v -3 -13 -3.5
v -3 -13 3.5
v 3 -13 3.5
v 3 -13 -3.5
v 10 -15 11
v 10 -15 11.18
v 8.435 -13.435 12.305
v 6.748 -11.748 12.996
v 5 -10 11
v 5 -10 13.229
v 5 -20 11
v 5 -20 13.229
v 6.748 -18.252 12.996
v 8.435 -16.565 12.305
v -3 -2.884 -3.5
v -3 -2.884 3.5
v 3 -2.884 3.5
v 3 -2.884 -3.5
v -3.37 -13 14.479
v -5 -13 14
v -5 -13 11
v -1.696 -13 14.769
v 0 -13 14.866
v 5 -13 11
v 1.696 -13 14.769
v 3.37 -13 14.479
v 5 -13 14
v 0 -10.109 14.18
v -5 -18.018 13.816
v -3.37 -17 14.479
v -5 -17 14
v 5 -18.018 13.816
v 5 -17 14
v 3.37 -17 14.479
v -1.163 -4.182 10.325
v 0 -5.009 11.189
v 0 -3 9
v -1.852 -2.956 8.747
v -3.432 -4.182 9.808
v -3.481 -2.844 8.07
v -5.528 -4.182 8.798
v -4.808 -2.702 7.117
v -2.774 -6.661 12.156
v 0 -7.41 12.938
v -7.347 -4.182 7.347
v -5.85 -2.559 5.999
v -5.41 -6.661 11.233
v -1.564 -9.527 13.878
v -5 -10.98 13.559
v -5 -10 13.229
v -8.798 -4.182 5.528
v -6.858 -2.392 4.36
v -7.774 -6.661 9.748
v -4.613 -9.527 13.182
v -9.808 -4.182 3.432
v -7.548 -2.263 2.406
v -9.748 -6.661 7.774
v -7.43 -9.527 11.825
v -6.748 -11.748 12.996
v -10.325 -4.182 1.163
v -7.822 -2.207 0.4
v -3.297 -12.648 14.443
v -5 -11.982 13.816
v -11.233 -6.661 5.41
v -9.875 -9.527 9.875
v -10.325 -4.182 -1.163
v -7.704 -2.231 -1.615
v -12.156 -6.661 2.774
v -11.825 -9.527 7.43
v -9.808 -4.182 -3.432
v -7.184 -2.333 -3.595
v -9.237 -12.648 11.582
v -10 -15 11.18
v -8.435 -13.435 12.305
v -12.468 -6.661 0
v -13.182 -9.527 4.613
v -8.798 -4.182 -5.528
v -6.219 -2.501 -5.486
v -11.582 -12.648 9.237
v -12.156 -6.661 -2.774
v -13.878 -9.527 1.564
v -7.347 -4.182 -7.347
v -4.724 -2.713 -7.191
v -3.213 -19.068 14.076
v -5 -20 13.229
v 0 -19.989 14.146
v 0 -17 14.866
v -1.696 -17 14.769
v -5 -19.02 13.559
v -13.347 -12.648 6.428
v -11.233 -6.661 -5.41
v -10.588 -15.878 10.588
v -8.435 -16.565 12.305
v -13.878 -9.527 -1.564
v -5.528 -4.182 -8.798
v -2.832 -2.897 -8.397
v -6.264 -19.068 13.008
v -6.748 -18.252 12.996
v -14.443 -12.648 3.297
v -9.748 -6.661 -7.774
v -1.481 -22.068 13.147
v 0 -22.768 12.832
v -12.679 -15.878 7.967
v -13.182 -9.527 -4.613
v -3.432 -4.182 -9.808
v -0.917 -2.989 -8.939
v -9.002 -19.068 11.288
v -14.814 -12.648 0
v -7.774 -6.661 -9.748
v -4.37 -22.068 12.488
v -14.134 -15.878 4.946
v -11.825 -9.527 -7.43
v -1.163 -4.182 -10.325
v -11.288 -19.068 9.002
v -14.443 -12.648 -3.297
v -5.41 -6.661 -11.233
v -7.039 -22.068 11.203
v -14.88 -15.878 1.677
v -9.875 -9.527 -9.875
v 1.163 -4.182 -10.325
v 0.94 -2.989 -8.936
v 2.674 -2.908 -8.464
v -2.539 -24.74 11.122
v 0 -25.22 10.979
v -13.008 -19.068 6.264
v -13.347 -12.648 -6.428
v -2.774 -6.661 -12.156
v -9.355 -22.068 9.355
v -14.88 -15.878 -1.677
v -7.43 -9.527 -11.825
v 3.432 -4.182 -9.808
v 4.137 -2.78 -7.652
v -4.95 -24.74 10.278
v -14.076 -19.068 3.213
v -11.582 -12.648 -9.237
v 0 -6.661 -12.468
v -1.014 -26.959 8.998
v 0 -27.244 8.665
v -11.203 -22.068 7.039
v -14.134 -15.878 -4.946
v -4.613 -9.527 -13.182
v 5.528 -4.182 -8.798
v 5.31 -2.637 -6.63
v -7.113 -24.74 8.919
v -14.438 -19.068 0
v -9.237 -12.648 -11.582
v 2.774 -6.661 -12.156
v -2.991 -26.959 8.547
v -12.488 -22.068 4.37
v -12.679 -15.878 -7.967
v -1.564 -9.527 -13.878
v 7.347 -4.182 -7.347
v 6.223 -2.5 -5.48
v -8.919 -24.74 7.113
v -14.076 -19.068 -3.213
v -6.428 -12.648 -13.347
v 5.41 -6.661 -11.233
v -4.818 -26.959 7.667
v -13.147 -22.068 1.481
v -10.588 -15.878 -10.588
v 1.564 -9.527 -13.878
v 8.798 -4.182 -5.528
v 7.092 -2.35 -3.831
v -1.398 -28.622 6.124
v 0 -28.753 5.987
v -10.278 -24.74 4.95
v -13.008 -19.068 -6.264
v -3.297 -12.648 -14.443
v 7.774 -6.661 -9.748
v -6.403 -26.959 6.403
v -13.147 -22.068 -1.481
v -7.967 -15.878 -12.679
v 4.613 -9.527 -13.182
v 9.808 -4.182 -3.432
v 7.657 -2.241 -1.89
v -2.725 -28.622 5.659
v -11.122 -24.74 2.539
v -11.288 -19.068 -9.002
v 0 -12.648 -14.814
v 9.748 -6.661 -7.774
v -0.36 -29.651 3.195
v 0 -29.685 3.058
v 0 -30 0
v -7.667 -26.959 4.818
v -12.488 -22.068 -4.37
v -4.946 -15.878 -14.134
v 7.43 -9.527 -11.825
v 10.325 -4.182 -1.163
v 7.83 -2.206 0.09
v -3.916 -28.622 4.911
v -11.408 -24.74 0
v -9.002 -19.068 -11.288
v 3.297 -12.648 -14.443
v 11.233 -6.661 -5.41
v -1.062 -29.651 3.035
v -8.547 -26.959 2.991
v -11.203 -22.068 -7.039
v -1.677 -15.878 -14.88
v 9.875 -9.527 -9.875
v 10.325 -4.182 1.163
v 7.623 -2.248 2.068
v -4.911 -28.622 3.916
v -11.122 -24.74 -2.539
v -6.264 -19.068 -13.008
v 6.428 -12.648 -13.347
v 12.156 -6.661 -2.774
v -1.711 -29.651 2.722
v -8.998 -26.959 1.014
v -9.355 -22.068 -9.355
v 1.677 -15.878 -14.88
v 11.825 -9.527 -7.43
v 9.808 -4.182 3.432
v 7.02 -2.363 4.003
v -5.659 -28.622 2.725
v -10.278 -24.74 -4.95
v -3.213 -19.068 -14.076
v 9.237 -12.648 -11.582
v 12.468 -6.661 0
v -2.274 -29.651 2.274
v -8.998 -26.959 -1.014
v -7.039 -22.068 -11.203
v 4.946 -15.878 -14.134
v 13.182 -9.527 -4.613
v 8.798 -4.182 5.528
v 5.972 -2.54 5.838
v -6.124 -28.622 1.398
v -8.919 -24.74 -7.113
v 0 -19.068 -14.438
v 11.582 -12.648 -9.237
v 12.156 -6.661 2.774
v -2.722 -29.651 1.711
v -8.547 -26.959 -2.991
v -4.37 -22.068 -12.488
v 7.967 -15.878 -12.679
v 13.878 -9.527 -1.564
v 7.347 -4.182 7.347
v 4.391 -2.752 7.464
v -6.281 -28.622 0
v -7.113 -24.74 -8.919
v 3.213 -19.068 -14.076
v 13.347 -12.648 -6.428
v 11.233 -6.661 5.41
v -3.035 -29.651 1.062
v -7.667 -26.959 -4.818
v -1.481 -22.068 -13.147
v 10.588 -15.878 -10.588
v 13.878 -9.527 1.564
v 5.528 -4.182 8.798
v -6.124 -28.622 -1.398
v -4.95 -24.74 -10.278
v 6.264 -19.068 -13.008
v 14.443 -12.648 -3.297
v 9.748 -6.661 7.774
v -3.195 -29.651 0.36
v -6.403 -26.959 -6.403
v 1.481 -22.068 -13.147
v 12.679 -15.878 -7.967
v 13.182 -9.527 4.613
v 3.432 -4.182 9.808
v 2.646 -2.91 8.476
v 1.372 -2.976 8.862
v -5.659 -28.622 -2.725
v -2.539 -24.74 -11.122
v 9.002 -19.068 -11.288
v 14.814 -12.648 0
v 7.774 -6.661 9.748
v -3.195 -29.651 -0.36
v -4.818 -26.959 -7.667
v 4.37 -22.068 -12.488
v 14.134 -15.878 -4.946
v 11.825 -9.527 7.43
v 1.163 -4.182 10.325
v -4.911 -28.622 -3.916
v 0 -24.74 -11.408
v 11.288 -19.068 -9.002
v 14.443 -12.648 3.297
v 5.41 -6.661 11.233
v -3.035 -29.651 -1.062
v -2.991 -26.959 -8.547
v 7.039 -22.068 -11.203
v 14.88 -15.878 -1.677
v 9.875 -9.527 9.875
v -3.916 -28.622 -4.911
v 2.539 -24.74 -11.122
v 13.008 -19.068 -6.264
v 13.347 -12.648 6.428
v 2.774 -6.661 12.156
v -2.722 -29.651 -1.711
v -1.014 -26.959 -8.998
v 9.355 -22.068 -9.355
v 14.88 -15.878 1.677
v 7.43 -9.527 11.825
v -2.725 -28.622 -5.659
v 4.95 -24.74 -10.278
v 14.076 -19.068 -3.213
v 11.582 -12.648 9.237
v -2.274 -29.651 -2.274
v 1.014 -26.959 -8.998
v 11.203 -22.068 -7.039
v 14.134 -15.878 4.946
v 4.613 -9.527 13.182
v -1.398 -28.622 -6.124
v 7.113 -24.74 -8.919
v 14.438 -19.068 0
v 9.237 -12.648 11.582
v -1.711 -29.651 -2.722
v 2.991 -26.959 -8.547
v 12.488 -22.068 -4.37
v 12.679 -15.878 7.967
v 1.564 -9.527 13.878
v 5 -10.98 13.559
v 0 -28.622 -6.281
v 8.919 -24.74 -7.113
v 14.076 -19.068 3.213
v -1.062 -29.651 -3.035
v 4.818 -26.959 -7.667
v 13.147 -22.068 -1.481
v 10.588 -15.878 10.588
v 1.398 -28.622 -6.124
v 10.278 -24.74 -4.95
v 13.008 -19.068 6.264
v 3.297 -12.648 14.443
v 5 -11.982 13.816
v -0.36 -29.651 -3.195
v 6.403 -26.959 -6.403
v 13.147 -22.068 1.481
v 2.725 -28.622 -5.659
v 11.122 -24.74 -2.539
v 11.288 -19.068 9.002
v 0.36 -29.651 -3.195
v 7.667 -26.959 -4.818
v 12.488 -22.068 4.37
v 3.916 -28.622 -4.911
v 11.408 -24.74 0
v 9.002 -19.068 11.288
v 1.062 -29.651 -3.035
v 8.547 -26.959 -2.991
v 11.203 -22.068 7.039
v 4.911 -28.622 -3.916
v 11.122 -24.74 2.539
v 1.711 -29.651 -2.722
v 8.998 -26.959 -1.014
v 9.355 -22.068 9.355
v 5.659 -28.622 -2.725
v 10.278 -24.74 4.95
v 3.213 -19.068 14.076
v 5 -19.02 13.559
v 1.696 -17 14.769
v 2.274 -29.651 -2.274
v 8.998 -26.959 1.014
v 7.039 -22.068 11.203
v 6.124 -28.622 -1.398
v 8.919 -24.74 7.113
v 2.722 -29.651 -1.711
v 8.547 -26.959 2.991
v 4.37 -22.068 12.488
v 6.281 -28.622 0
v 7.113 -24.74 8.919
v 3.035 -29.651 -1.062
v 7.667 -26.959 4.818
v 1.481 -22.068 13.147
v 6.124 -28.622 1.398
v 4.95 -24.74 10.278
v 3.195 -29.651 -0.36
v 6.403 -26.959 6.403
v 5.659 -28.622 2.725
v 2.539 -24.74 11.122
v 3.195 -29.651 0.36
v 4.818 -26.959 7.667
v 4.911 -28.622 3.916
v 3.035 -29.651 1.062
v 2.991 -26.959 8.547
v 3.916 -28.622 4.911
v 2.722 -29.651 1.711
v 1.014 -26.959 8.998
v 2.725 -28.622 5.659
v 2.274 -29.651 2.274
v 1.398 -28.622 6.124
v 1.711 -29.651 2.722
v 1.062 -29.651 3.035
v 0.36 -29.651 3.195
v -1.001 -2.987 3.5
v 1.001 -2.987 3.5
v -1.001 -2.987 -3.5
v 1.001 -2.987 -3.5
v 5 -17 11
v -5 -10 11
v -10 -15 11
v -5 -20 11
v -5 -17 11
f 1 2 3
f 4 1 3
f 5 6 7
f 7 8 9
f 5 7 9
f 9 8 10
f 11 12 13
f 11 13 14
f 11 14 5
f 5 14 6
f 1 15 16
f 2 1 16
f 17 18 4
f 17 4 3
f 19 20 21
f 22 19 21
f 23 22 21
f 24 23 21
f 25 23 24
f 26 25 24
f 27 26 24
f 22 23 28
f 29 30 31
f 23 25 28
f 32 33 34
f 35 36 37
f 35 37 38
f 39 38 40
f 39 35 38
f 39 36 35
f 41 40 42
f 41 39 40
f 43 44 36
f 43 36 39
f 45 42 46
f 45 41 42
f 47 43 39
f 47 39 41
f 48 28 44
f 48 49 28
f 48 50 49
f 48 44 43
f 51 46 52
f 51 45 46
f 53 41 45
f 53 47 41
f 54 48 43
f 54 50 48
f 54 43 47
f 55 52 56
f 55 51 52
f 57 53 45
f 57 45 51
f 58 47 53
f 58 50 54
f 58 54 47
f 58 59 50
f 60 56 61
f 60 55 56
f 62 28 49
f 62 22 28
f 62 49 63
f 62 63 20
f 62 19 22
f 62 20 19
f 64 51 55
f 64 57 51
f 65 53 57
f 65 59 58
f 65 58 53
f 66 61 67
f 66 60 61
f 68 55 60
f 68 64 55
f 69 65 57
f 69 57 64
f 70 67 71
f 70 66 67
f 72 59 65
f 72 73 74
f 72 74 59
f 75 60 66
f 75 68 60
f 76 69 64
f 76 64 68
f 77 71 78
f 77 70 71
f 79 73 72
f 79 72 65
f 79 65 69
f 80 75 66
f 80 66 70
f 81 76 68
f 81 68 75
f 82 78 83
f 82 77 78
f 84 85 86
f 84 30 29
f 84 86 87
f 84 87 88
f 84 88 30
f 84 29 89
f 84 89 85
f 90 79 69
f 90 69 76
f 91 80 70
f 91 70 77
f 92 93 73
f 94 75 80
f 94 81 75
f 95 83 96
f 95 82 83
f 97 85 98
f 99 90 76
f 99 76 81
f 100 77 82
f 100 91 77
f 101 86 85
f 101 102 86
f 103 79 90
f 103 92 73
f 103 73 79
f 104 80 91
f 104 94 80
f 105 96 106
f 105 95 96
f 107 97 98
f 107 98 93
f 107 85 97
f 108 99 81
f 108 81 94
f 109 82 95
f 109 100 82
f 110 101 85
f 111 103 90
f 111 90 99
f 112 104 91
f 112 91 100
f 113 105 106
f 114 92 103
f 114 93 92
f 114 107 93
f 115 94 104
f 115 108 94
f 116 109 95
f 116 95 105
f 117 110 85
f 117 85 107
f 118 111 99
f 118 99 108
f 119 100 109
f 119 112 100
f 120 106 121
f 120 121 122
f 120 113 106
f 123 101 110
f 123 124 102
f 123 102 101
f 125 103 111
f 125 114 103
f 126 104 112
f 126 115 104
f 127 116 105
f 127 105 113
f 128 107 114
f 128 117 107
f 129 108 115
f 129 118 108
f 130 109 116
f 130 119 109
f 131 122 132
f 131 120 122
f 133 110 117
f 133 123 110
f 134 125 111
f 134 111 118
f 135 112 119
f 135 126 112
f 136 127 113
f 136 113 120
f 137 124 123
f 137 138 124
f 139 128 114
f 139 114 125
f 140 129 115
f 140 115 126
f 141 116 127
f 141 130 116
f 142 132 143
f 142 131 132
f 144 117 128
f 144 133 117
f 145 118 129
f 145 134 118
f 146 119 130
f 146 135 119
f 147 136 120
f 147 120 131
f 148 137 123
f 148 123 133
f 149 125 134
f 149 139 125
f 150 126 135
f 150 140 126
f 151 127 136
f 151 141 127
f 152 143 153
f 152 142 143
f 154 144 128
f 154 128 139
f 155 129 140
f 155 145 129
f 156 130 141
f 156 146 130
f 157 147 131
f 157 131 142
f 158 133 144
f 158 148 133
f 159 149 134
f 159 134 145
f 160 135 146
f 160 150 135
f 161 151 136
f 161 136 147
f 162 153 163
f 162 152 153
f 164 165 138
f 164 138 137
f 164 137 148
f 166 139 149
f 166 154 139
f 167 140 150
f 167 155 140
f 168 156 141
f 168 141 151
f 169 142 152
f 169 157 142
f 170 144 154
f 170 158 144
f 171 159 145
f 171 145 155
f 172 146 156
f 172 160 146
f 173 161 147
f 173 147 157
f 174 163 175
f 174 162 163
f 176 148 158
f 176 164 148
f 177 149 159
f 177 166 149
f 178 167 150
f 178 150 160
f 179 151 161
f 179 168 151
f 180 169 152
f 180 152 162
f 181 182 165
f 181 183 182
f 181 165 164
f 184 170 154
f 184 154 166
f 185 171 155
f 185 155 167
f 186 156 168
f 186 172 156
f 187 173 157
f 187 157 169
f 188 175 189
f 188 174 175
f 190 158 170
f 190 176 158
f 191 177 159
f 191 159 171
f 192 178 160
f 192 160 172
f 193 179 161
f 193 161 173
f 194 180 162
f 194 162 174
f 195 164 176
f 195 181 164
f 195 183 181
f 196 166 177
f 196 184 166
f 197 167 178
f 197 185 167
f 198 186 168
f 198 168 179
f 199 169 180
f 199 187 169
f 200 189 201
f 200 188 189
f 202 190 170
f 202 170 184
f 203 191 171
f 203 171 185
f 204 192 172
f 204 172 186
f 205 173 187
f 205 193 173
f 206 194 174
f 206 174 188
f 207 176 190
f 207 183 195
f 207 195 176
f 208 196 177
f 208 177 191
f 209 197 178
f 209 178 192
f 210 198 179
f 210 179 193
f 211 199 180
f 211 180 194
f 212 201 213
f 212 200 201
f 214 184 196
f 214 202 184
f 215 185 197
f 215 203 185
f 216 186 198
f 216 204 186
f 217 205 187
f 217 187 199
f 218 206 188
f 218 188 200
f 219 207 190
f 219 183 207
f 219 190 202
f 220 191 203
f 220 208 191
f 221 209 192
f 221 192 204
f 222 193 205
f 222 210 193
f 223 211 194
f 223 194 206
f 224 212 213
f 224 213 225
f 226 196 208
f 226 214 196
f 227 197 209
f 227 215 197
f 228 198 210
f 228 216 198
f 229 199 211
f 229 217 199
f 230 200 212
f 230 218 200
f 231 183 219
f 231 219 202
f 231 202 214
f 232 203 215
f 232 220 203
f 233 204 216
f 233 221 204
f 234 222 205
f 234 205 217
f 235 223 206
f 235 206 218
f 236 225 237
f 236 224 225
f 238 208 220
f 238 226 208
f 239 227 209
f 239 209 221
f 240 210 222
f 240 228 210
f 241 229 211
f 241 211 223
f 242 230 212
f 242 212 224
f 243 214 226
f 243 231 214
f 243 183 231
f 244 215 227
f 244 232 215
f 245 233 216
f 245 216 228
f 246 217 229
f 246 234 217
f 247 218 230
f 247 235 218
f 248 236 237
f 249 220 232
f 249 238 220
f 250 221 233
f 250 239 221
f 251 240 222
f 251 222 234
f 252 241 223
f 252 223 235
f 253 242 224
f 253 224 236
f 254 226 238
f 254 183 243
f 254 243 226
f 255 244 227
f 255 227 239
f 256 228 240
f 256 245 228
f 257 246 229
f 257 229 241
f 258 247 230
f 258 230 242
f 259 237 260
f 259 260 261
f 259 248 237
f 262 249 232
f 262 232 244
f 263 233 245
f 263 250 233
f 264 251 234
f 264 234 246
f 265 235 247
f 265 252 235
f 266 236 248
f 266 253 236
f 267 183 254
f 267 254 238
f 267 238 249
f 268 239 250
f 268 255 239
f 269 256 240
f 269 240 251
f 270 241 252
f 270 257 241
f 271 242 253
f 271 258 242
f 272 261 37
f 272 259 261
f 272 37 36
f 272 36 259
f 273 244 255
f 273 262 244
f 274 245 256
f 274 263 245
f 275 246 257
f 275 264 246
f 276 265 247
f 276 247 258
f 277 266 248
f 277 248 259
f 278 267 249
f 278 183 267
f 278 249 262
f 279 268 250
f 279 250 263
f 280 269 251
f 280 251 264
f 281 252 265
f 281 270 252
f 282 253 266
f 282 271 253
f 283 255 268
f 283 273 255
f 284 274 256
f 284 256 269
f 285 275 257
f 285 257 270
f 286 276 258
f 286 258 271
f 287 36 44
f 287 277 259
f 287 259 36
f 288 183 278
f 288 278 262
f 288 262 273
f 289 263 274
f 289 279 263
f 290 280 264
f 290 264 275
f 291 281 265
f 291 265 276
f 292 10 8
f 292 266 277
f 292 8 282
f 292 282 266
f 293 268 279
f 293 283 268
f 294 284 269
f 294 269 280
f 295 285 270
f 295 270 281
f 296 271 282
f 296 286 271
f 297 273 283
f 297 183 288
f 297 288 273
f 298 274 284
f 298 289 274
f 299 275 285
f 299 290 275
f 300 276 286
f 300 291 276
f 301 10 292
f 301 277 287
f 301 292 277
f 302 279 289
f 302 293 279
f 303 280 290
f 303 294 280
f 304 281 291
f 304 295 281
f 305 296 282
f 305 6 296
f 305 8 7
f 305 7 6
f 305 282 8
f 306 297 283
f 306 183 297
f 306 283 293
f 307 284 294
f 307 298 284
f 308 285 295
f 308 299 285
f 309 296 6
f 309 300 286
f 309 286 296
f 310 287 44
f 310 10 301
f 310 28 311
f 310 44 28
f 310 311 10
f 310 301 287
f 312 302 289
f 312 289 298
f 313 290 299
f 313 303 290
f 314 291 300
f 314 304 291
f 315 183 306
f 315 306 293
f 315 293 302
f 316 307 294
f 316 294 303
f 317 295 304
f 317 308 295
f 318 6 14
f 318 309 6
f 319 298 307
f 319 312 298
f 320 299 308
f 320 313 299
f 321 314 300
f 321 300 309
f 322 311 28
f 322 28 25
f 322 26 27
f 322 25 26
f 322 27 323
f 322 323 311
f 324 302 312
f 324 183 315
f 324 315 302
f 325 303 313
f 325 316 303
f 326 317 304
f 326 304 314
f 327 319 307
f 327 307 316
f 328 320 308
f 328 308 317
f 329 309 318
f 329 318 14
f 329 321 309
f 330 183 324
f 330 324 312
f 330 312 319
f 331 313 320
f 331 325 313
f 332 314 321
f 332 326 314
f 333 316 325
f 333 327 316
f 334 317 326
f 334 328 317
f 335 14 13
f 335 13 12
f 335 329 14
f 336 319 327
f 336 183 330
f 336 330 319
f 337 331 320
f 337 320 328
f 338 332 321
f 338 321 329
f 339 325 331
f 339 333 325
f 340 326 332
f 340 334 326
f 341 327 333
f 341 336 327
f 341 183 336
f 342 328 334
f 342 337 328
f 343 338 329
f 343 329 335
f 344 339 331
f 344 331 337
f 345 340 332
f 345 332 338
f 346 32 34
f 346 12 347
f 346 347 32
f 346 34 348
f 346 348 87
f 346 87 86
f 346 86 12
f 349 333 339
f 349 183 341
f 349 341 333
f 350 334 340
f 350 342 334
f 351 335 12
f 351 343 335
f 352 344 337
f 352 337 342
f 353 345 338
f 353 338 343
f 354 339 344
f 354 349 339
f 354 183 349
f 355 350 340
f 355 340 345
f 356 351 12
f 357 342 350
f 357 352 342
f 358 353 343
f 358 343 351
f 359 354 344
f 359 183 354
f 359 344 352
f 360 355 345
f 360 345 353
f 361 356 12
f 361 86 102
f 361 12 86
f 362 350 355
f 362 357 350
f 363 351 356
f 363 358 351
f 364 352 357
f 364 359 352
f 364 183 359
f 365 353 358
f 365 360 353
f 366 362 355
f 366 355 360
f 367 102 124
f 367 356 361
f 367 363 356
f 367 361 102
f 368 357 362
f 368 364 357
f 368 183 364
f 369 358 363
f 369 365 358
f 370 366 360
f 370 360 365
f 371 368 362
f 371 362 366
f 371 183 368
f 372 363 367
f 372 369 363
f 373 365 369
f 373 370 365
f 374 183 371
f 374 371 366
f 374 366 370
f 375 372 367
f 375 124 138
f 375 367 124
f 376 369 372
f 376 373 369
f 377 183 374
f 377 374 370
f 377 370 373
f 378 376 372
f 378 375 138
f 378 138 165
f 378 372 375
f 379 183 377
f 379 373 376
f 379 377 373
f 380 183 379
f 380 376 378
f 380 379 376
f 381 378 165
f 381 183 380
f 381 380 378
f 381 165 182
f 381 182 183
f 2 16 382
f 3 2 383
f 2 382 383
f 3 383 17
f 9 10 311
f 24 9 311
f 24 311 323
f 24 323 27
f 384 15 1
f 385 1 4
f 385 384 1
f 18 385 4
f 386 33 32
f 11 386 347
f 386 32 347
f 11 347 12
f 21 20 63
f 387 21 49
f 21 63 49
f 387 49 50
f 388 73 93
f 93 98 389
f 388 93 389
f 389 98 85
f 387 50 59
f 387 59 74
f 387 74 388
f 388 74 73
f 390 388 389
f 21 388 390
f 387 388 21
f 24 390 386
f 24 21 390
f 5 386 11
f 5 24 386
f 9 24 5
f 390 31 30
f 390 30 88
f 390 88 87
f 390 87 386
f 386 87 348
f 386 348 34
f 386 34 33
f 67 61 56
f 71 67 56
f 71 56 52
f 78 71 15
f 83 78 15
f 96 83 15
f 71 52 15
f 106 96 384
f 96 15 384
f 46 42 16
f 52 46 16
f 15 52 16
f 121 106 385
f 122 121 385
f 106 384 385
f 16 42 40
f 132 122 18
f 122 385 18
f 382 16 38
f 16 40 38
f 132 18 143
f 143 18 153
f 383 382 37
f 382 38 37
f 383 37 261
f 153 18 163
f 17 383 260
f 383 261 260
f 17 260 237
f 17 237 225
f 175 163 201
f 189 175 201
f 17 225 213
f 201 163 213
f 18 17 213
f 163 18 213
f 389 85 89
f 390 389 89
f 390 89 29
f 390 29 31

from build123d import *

# Parameters (mm, degrees)
F4_DEPTH = 30.001
F5_W     = 6
F5_H     = 7
F6_DEPTH = 13
F8_W     = 10
F8_H     = 4
F9_DEPTH = 7


with BuildPart() as f1:
    # F0 (on Right) → F1 (revolve)
    with BuildSketch(Plane.YZ):
        with BuildLine():
            Line((-30, 0), (0, 0))
            ThreePointArc((0, 0), (-15, 15), (-30, 0))
        make_face()
    revolve(axis=Axis((0, -15, 0), (0, -1, 0)))

    # F3 (on offset) → F4 (cut, through all)
    with BuildSketch(Plane.XY.offset(15)):
        with BuildLine():
            Line((15, 0), (0, 0))
            Line((0, 0), (-15, 0))
            ThreePointArc((-15, 0), (0, -3), (15, 0))
        make_face()
    extrude(amount=-F4_DEPTH, mode=Mode.SUBTRACT)

    # F5 (on Front) → F6 (cut)
    with BuildSketch(Plane.XZ):
        Rectangle(F5_W, F5_H)
    extrude(amount=F6_DEPTH, mode=Mode.SUBTRACT)

    # F8 (on offset) → F9 (cut)
    with BuildSketch(Plane.XY.offset(18)):
        with Locations((0, -15)):
            Rectangle(F8_W, F8_H)
        Polygon((-5, -17), (-5, -13), (-5, -10), (-10, -15), (-5, -20), align=None)
        Polygon((5, -10), (5, -13), (5, -17), (5, -20), (10, -15), align=None)
    extrude(amount=-F9_DEPTH, mode=Mode.SUBTRACT)


solid = f1.part
